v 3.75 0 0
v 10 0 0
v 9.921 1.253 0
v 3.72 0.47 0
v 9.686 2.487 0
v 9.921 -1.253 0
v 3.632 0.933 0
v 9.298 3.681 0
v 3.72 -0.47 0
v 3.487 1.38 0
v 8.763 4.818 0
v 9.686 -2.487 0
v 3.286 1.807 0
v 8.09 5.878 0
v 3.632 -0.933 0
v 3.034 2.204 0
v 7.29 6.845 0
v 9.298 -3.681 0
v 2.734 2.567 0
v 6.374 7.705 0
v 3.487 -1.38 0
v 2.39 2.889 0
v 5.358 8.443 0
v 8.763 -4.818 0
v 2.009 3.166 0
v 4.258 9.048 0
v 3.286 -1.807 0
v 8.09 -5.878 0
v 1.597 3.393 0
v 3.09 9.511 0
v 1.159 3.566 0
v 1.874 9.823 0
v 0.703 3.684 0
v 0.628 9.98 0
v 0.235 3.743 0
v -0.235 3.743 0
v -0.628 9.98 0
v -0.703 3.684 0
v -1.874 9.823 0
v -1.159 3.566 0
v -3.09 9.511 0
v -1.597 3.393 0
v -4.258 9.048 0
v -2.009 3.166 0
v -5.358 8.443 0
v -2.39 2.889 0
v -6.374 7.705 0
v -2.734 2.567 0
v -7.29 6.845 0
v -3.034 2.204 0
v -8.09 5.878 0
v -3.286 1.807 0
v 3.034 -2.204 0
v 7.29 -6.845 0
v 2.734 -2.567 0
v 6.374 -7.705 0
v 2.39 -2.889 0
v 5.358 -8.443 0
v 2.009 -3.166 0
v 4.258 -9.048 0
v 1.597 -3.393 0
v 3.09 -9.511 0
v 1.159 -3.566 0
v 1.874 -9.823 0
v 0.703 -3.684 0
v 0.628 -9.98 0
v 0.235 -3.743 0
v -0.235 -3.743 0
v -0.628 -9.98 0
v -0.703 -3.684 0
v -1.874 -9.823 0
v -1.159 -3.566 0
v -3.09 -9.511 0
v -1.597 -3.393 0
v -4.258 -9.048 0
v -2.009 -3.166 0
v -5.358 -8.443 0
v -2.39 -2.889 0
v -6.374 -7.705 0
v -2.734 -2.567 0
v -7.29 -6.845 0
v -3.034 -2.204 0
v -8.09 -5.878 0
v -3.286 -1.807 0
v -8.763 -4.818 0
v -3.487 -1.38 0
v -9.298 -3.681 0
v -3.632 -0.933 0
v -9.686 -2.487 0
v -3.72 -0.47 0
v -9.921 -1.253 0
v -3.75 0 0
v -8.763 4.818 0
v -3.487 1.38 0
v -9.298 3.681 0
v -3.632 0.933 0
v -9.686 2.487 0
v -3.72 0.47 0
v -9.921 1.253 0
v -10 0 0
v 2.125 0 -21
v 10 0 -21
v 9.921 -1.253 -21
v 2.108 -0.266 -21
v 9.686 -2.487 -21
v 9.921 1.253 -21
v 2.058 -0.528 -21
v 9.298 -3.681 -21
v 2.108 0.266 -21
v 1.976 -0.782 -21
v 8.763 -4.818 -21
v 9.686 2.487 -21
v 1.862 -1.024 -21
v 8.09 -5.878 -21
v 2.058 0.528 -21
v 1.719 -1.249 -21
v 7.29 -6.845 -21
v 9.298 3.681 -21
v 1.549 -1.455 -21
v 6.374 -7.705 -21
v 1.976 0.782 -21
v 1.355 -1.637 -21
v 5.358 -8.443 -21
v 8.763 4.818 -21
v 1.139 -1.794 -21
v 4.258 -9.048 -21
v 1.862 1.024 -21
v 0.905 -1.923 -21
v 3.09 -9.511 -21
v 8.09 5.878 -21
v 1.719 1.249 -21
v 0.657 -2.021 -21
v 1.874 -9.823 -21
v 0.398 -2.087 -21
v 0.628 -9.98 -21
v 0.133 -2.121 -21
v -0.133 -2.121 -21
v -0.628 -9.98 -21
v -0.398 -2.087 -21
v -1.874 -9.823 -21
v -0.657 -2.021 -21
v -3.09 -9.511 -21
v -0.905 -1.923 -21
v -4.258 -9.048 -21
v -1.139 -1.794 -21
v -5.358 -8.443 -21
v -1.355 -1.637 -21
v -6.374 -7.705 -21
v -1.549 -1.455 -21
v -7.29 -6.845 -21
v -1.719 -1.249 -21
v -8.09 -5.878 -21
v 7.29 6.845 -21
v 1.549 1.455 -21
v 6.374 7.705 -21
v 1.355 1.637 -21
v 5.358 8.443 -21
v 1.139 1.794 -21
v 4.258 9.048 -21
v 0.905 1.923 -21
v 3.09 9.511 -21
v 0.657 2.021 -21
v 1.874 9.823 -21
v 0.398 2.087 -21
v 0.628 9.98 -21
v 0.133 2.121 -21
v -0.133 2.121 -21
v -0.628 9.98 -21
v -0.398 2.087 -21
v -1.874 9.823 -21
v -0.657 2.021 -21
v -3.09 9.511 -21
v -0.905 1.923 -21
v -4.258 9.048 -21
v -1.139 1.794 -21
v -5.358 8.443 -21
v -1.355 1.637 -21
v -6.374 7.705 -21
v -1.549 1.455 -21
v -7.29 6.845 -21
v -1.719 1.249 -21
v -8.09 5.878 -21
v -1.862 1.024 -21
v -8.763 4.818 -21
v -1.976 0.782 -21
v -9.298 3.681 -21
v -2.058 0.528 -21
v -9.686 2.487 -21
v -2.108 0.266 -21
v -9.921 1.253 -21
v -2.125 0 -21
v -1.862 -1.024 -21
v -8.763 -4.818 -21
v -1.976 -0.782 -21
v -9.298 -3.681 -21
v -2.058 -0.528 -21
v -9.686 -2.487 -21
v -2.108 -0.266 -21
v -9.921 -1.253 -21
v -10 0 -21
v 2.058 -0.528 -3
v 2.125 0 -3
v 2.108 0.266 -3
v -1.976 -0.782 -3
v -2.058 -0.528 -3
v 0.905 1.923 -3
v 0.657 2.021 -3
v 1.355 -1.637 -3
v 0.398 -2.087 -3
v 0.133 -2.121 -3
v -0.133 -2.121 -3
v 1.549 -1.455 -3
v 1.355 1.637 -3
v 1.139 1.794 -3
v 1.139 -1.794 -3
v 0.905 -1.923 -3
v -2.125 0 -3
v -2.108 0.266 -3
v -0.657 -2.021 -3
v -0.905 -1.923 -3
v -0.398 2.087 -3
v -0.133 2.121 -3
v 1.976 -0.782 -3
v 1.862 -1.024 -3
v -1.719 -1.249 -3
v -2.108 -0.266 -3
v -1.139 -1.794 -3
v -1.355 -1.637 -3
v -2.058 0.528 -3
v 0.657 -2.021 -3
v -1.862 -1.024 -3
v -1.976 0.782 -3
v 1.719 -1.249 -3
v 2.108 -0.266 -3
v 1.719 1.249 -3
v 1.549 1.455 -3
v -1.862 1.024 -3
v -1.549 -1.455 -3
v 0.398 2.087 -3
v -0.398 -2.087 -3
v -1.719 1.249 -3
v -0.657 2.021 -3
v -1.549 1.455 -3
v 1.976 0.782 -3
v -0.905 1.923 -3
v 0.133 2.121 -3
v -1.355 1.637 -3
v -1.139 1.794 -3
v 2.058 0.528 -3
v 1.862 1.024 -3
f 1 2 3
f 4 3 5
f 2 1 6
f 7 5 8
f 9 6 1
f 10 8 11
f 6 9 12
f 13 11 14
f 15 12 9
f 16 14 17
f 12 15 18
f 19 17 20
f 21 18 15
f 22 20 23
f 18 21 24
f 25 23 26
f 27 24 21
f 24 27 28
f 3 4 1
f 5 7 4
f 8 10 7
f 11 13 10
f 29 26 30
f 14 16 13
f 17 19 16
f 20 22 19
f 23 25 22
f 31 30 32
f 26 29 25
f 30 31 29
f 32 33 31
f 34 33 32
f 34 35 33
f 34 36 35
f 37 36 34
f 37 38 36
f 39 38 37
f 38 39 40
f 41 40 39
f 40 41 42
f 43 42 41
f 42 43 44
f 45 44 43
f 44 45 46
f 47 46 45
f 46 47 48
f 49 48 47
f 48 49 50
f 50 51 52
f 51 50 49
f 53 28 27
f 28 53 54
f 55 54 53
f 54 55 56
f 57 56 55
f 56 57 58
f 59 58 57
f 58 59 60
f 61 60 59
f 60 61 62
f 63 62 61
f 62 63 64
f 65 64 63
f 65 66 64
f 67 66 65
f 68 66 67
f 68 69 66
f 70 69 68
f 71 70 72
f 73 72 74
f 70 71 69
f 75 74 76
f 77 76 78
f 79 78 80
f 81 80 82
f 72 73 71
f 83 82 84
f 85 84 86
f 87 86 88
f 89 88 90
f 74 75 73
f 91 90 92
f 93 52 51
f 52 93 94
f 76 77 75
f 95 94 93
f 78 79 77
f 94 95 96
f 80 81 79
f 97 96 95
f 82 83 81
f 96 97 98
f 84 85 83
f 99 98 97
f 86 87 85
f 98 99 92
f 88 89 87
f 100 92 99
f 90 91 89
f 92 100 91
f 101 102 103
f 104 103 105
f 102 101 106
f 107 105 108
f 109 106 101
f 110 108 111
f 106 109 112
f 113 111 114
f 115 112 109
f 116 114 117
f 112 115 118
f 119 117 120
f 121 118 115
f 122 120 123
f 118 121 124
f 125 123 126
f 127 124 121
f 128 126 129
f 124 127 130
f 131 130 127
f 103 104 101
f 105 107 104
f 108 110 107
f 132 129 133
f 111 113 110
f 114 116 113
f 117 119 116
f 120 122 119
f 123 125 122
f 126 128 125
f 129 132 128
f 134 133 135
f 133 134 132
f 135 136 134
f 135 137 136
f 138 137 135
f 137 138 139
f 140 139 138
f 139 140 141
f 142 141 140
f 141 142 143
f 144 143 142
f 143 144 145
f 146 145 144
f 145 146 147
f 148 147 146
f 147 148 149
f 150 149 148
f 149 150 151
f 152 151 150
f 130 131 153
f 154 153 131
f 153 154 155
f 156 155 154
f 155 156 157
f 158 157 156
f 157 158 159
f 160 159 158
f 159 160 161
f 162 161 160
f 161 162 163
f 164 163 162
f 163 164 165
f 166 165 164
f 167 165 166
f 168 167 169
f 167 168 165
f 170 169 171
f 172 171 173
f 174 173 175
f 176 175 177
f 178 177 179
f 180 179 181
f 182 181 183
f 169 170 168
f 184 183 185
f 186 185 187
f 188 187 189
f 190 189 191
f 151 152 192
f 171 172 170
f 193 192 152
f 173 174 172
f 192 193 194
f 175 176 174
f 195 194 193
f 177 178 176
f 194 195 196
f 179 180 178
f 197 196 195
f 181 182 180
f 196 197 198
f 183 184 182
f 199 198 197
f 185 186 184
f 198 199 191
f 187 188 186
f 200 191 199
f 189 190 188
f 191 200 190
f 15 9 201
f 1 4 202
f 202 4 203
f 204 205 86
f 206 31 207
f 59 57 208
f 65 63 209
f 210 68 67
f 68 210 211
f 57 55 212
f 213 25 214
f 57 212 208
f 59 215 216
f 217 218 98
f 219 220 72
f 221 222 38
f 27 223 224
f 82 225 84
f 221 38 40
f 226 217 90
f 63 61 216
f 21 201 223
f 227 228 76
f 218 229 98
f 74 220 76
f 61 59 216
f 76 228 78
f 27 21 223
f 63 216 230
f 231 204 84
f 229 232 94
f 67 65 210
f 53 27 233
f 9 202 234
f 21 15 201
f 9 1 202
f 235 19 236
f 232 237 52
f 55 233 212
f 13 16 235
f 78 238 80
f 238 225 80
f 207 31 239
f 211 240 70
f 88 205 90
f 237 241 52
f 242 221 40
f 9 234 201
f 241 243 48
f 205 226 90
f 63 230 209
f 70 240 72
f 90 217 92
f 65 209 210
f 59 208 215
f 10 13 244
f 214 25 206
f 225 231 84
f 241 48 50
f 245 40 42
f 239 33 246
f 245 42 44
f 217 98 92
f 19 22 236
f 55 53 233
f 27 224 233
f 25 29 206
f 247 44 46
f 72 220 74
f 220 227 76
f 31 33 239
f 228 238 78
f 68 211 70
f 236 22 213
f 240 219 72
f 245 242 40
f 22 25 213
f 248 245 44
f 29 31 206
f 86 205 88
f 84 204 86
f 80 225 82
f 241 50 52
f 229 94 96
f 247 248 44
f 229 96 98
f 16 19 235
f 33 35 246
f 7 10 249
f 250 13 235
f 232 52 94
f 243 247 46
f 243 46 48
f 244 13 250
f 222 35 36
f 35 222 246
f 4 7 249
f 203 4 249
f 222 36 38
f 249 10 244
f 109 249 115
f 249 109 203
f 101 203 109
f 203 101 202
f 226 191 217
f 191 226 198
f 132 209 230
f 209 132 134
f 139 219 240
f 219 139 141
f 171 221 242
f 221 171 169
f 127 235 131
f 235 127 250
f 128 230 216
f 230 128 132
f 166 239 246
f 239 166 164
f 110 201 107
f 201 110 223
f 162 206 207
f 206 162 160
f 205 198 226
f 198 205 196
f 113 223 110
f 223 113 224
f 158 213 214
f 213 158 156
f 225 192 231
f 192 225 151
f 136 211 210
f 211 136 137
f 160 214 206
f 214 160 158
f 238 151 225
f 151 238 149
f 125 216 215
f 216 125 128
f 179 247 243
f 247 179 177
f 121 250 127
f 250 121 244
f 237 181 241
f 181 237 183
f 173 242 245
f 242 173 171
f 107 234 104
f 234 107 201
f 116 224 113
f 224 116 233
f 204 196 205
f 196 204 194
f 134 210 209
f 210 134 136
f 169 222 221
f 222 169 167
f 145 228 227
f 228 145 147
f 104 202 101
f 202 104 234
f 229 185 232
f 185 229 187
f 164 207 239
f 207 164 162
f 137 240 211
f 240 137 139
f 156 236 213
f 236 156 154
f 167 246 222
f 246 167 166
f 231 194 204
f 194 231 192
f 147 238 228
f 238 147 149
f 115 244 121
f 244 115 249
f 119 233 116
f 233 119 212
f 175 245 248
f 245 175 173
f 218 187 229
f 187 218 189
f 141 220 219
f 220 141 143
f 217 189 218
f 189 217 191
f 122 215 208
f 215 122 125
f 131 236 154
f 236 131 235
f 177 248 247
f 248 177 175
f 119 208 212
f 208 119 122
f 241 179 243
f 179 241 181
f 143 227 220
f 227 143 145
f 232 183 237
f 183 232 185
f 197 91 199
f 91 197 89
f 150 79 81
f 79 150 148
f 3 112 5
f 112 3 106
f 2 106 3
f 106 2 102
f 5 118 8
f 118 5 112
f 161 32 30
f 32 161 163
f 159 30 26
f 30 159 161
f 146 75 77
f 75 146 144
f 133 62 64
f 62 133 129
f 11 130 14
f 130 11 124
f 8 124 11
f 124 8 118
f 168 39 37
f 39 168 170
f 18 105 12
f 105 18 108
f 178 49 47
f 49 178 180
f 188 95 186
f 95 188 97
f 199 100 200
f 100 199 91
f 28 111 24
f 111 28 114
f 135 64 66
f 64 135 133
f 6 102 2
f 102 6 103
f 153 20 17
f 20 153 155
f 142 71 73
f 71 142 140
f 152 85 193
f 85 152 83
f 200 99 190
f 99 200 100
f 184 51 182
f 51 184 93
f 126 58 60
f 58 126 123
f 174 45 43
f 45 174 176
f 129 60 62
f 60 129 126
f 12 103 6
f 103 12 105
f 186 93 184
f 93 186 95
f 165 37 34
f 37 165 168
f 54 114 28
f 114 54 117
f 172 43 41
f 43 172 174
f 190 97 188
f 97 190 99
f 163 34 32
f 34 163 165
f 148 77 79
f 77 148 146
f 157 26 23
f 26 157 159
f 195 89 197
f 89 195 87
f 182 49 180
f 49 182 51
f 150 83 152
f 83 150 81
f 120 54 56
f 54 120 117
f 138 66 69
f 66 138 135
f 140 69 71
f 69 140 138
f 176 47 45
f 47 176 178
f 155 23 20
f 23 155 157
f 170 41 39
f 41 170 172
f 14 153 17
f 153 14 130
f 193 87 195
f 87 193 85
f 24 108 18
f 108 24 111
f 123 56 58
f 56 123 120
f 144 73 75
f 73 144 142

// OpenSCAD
$fn = 50;


difference() {
	union() {
		translate(v = [0, 0, -21.0000000000]) {
			cylinder(h = 21, r = 10.0000000000);
		}
		cylinder(h = 0, r = 20.0000000000);
	}
	union() {
		translate(v = [0, 0, 0]) {
			rotate(a = [0, 0, 0]) {
				difference() {
					union() {
						#translate(v = [0, 0, -21.0000000000]) {
							cylinder(h = 21, r = 2.0000000000);
						}
						#translate(v = [0, 0, -3]) {
							cylinder(h = 3, r1 = 2.1250000000, r2 = 3.7500000000);
						}
						#translate(v = [0, 0, -21.0000000000]) {
							cylinder(h = 21, r = 2.1250000000);
						}
						#translate(v = [0, 0, -21.0000000000]) {
							cylinder(h = 21, r = 2.0000000000);
						}
					}
					union();
				}
			}
		}
	}
}
